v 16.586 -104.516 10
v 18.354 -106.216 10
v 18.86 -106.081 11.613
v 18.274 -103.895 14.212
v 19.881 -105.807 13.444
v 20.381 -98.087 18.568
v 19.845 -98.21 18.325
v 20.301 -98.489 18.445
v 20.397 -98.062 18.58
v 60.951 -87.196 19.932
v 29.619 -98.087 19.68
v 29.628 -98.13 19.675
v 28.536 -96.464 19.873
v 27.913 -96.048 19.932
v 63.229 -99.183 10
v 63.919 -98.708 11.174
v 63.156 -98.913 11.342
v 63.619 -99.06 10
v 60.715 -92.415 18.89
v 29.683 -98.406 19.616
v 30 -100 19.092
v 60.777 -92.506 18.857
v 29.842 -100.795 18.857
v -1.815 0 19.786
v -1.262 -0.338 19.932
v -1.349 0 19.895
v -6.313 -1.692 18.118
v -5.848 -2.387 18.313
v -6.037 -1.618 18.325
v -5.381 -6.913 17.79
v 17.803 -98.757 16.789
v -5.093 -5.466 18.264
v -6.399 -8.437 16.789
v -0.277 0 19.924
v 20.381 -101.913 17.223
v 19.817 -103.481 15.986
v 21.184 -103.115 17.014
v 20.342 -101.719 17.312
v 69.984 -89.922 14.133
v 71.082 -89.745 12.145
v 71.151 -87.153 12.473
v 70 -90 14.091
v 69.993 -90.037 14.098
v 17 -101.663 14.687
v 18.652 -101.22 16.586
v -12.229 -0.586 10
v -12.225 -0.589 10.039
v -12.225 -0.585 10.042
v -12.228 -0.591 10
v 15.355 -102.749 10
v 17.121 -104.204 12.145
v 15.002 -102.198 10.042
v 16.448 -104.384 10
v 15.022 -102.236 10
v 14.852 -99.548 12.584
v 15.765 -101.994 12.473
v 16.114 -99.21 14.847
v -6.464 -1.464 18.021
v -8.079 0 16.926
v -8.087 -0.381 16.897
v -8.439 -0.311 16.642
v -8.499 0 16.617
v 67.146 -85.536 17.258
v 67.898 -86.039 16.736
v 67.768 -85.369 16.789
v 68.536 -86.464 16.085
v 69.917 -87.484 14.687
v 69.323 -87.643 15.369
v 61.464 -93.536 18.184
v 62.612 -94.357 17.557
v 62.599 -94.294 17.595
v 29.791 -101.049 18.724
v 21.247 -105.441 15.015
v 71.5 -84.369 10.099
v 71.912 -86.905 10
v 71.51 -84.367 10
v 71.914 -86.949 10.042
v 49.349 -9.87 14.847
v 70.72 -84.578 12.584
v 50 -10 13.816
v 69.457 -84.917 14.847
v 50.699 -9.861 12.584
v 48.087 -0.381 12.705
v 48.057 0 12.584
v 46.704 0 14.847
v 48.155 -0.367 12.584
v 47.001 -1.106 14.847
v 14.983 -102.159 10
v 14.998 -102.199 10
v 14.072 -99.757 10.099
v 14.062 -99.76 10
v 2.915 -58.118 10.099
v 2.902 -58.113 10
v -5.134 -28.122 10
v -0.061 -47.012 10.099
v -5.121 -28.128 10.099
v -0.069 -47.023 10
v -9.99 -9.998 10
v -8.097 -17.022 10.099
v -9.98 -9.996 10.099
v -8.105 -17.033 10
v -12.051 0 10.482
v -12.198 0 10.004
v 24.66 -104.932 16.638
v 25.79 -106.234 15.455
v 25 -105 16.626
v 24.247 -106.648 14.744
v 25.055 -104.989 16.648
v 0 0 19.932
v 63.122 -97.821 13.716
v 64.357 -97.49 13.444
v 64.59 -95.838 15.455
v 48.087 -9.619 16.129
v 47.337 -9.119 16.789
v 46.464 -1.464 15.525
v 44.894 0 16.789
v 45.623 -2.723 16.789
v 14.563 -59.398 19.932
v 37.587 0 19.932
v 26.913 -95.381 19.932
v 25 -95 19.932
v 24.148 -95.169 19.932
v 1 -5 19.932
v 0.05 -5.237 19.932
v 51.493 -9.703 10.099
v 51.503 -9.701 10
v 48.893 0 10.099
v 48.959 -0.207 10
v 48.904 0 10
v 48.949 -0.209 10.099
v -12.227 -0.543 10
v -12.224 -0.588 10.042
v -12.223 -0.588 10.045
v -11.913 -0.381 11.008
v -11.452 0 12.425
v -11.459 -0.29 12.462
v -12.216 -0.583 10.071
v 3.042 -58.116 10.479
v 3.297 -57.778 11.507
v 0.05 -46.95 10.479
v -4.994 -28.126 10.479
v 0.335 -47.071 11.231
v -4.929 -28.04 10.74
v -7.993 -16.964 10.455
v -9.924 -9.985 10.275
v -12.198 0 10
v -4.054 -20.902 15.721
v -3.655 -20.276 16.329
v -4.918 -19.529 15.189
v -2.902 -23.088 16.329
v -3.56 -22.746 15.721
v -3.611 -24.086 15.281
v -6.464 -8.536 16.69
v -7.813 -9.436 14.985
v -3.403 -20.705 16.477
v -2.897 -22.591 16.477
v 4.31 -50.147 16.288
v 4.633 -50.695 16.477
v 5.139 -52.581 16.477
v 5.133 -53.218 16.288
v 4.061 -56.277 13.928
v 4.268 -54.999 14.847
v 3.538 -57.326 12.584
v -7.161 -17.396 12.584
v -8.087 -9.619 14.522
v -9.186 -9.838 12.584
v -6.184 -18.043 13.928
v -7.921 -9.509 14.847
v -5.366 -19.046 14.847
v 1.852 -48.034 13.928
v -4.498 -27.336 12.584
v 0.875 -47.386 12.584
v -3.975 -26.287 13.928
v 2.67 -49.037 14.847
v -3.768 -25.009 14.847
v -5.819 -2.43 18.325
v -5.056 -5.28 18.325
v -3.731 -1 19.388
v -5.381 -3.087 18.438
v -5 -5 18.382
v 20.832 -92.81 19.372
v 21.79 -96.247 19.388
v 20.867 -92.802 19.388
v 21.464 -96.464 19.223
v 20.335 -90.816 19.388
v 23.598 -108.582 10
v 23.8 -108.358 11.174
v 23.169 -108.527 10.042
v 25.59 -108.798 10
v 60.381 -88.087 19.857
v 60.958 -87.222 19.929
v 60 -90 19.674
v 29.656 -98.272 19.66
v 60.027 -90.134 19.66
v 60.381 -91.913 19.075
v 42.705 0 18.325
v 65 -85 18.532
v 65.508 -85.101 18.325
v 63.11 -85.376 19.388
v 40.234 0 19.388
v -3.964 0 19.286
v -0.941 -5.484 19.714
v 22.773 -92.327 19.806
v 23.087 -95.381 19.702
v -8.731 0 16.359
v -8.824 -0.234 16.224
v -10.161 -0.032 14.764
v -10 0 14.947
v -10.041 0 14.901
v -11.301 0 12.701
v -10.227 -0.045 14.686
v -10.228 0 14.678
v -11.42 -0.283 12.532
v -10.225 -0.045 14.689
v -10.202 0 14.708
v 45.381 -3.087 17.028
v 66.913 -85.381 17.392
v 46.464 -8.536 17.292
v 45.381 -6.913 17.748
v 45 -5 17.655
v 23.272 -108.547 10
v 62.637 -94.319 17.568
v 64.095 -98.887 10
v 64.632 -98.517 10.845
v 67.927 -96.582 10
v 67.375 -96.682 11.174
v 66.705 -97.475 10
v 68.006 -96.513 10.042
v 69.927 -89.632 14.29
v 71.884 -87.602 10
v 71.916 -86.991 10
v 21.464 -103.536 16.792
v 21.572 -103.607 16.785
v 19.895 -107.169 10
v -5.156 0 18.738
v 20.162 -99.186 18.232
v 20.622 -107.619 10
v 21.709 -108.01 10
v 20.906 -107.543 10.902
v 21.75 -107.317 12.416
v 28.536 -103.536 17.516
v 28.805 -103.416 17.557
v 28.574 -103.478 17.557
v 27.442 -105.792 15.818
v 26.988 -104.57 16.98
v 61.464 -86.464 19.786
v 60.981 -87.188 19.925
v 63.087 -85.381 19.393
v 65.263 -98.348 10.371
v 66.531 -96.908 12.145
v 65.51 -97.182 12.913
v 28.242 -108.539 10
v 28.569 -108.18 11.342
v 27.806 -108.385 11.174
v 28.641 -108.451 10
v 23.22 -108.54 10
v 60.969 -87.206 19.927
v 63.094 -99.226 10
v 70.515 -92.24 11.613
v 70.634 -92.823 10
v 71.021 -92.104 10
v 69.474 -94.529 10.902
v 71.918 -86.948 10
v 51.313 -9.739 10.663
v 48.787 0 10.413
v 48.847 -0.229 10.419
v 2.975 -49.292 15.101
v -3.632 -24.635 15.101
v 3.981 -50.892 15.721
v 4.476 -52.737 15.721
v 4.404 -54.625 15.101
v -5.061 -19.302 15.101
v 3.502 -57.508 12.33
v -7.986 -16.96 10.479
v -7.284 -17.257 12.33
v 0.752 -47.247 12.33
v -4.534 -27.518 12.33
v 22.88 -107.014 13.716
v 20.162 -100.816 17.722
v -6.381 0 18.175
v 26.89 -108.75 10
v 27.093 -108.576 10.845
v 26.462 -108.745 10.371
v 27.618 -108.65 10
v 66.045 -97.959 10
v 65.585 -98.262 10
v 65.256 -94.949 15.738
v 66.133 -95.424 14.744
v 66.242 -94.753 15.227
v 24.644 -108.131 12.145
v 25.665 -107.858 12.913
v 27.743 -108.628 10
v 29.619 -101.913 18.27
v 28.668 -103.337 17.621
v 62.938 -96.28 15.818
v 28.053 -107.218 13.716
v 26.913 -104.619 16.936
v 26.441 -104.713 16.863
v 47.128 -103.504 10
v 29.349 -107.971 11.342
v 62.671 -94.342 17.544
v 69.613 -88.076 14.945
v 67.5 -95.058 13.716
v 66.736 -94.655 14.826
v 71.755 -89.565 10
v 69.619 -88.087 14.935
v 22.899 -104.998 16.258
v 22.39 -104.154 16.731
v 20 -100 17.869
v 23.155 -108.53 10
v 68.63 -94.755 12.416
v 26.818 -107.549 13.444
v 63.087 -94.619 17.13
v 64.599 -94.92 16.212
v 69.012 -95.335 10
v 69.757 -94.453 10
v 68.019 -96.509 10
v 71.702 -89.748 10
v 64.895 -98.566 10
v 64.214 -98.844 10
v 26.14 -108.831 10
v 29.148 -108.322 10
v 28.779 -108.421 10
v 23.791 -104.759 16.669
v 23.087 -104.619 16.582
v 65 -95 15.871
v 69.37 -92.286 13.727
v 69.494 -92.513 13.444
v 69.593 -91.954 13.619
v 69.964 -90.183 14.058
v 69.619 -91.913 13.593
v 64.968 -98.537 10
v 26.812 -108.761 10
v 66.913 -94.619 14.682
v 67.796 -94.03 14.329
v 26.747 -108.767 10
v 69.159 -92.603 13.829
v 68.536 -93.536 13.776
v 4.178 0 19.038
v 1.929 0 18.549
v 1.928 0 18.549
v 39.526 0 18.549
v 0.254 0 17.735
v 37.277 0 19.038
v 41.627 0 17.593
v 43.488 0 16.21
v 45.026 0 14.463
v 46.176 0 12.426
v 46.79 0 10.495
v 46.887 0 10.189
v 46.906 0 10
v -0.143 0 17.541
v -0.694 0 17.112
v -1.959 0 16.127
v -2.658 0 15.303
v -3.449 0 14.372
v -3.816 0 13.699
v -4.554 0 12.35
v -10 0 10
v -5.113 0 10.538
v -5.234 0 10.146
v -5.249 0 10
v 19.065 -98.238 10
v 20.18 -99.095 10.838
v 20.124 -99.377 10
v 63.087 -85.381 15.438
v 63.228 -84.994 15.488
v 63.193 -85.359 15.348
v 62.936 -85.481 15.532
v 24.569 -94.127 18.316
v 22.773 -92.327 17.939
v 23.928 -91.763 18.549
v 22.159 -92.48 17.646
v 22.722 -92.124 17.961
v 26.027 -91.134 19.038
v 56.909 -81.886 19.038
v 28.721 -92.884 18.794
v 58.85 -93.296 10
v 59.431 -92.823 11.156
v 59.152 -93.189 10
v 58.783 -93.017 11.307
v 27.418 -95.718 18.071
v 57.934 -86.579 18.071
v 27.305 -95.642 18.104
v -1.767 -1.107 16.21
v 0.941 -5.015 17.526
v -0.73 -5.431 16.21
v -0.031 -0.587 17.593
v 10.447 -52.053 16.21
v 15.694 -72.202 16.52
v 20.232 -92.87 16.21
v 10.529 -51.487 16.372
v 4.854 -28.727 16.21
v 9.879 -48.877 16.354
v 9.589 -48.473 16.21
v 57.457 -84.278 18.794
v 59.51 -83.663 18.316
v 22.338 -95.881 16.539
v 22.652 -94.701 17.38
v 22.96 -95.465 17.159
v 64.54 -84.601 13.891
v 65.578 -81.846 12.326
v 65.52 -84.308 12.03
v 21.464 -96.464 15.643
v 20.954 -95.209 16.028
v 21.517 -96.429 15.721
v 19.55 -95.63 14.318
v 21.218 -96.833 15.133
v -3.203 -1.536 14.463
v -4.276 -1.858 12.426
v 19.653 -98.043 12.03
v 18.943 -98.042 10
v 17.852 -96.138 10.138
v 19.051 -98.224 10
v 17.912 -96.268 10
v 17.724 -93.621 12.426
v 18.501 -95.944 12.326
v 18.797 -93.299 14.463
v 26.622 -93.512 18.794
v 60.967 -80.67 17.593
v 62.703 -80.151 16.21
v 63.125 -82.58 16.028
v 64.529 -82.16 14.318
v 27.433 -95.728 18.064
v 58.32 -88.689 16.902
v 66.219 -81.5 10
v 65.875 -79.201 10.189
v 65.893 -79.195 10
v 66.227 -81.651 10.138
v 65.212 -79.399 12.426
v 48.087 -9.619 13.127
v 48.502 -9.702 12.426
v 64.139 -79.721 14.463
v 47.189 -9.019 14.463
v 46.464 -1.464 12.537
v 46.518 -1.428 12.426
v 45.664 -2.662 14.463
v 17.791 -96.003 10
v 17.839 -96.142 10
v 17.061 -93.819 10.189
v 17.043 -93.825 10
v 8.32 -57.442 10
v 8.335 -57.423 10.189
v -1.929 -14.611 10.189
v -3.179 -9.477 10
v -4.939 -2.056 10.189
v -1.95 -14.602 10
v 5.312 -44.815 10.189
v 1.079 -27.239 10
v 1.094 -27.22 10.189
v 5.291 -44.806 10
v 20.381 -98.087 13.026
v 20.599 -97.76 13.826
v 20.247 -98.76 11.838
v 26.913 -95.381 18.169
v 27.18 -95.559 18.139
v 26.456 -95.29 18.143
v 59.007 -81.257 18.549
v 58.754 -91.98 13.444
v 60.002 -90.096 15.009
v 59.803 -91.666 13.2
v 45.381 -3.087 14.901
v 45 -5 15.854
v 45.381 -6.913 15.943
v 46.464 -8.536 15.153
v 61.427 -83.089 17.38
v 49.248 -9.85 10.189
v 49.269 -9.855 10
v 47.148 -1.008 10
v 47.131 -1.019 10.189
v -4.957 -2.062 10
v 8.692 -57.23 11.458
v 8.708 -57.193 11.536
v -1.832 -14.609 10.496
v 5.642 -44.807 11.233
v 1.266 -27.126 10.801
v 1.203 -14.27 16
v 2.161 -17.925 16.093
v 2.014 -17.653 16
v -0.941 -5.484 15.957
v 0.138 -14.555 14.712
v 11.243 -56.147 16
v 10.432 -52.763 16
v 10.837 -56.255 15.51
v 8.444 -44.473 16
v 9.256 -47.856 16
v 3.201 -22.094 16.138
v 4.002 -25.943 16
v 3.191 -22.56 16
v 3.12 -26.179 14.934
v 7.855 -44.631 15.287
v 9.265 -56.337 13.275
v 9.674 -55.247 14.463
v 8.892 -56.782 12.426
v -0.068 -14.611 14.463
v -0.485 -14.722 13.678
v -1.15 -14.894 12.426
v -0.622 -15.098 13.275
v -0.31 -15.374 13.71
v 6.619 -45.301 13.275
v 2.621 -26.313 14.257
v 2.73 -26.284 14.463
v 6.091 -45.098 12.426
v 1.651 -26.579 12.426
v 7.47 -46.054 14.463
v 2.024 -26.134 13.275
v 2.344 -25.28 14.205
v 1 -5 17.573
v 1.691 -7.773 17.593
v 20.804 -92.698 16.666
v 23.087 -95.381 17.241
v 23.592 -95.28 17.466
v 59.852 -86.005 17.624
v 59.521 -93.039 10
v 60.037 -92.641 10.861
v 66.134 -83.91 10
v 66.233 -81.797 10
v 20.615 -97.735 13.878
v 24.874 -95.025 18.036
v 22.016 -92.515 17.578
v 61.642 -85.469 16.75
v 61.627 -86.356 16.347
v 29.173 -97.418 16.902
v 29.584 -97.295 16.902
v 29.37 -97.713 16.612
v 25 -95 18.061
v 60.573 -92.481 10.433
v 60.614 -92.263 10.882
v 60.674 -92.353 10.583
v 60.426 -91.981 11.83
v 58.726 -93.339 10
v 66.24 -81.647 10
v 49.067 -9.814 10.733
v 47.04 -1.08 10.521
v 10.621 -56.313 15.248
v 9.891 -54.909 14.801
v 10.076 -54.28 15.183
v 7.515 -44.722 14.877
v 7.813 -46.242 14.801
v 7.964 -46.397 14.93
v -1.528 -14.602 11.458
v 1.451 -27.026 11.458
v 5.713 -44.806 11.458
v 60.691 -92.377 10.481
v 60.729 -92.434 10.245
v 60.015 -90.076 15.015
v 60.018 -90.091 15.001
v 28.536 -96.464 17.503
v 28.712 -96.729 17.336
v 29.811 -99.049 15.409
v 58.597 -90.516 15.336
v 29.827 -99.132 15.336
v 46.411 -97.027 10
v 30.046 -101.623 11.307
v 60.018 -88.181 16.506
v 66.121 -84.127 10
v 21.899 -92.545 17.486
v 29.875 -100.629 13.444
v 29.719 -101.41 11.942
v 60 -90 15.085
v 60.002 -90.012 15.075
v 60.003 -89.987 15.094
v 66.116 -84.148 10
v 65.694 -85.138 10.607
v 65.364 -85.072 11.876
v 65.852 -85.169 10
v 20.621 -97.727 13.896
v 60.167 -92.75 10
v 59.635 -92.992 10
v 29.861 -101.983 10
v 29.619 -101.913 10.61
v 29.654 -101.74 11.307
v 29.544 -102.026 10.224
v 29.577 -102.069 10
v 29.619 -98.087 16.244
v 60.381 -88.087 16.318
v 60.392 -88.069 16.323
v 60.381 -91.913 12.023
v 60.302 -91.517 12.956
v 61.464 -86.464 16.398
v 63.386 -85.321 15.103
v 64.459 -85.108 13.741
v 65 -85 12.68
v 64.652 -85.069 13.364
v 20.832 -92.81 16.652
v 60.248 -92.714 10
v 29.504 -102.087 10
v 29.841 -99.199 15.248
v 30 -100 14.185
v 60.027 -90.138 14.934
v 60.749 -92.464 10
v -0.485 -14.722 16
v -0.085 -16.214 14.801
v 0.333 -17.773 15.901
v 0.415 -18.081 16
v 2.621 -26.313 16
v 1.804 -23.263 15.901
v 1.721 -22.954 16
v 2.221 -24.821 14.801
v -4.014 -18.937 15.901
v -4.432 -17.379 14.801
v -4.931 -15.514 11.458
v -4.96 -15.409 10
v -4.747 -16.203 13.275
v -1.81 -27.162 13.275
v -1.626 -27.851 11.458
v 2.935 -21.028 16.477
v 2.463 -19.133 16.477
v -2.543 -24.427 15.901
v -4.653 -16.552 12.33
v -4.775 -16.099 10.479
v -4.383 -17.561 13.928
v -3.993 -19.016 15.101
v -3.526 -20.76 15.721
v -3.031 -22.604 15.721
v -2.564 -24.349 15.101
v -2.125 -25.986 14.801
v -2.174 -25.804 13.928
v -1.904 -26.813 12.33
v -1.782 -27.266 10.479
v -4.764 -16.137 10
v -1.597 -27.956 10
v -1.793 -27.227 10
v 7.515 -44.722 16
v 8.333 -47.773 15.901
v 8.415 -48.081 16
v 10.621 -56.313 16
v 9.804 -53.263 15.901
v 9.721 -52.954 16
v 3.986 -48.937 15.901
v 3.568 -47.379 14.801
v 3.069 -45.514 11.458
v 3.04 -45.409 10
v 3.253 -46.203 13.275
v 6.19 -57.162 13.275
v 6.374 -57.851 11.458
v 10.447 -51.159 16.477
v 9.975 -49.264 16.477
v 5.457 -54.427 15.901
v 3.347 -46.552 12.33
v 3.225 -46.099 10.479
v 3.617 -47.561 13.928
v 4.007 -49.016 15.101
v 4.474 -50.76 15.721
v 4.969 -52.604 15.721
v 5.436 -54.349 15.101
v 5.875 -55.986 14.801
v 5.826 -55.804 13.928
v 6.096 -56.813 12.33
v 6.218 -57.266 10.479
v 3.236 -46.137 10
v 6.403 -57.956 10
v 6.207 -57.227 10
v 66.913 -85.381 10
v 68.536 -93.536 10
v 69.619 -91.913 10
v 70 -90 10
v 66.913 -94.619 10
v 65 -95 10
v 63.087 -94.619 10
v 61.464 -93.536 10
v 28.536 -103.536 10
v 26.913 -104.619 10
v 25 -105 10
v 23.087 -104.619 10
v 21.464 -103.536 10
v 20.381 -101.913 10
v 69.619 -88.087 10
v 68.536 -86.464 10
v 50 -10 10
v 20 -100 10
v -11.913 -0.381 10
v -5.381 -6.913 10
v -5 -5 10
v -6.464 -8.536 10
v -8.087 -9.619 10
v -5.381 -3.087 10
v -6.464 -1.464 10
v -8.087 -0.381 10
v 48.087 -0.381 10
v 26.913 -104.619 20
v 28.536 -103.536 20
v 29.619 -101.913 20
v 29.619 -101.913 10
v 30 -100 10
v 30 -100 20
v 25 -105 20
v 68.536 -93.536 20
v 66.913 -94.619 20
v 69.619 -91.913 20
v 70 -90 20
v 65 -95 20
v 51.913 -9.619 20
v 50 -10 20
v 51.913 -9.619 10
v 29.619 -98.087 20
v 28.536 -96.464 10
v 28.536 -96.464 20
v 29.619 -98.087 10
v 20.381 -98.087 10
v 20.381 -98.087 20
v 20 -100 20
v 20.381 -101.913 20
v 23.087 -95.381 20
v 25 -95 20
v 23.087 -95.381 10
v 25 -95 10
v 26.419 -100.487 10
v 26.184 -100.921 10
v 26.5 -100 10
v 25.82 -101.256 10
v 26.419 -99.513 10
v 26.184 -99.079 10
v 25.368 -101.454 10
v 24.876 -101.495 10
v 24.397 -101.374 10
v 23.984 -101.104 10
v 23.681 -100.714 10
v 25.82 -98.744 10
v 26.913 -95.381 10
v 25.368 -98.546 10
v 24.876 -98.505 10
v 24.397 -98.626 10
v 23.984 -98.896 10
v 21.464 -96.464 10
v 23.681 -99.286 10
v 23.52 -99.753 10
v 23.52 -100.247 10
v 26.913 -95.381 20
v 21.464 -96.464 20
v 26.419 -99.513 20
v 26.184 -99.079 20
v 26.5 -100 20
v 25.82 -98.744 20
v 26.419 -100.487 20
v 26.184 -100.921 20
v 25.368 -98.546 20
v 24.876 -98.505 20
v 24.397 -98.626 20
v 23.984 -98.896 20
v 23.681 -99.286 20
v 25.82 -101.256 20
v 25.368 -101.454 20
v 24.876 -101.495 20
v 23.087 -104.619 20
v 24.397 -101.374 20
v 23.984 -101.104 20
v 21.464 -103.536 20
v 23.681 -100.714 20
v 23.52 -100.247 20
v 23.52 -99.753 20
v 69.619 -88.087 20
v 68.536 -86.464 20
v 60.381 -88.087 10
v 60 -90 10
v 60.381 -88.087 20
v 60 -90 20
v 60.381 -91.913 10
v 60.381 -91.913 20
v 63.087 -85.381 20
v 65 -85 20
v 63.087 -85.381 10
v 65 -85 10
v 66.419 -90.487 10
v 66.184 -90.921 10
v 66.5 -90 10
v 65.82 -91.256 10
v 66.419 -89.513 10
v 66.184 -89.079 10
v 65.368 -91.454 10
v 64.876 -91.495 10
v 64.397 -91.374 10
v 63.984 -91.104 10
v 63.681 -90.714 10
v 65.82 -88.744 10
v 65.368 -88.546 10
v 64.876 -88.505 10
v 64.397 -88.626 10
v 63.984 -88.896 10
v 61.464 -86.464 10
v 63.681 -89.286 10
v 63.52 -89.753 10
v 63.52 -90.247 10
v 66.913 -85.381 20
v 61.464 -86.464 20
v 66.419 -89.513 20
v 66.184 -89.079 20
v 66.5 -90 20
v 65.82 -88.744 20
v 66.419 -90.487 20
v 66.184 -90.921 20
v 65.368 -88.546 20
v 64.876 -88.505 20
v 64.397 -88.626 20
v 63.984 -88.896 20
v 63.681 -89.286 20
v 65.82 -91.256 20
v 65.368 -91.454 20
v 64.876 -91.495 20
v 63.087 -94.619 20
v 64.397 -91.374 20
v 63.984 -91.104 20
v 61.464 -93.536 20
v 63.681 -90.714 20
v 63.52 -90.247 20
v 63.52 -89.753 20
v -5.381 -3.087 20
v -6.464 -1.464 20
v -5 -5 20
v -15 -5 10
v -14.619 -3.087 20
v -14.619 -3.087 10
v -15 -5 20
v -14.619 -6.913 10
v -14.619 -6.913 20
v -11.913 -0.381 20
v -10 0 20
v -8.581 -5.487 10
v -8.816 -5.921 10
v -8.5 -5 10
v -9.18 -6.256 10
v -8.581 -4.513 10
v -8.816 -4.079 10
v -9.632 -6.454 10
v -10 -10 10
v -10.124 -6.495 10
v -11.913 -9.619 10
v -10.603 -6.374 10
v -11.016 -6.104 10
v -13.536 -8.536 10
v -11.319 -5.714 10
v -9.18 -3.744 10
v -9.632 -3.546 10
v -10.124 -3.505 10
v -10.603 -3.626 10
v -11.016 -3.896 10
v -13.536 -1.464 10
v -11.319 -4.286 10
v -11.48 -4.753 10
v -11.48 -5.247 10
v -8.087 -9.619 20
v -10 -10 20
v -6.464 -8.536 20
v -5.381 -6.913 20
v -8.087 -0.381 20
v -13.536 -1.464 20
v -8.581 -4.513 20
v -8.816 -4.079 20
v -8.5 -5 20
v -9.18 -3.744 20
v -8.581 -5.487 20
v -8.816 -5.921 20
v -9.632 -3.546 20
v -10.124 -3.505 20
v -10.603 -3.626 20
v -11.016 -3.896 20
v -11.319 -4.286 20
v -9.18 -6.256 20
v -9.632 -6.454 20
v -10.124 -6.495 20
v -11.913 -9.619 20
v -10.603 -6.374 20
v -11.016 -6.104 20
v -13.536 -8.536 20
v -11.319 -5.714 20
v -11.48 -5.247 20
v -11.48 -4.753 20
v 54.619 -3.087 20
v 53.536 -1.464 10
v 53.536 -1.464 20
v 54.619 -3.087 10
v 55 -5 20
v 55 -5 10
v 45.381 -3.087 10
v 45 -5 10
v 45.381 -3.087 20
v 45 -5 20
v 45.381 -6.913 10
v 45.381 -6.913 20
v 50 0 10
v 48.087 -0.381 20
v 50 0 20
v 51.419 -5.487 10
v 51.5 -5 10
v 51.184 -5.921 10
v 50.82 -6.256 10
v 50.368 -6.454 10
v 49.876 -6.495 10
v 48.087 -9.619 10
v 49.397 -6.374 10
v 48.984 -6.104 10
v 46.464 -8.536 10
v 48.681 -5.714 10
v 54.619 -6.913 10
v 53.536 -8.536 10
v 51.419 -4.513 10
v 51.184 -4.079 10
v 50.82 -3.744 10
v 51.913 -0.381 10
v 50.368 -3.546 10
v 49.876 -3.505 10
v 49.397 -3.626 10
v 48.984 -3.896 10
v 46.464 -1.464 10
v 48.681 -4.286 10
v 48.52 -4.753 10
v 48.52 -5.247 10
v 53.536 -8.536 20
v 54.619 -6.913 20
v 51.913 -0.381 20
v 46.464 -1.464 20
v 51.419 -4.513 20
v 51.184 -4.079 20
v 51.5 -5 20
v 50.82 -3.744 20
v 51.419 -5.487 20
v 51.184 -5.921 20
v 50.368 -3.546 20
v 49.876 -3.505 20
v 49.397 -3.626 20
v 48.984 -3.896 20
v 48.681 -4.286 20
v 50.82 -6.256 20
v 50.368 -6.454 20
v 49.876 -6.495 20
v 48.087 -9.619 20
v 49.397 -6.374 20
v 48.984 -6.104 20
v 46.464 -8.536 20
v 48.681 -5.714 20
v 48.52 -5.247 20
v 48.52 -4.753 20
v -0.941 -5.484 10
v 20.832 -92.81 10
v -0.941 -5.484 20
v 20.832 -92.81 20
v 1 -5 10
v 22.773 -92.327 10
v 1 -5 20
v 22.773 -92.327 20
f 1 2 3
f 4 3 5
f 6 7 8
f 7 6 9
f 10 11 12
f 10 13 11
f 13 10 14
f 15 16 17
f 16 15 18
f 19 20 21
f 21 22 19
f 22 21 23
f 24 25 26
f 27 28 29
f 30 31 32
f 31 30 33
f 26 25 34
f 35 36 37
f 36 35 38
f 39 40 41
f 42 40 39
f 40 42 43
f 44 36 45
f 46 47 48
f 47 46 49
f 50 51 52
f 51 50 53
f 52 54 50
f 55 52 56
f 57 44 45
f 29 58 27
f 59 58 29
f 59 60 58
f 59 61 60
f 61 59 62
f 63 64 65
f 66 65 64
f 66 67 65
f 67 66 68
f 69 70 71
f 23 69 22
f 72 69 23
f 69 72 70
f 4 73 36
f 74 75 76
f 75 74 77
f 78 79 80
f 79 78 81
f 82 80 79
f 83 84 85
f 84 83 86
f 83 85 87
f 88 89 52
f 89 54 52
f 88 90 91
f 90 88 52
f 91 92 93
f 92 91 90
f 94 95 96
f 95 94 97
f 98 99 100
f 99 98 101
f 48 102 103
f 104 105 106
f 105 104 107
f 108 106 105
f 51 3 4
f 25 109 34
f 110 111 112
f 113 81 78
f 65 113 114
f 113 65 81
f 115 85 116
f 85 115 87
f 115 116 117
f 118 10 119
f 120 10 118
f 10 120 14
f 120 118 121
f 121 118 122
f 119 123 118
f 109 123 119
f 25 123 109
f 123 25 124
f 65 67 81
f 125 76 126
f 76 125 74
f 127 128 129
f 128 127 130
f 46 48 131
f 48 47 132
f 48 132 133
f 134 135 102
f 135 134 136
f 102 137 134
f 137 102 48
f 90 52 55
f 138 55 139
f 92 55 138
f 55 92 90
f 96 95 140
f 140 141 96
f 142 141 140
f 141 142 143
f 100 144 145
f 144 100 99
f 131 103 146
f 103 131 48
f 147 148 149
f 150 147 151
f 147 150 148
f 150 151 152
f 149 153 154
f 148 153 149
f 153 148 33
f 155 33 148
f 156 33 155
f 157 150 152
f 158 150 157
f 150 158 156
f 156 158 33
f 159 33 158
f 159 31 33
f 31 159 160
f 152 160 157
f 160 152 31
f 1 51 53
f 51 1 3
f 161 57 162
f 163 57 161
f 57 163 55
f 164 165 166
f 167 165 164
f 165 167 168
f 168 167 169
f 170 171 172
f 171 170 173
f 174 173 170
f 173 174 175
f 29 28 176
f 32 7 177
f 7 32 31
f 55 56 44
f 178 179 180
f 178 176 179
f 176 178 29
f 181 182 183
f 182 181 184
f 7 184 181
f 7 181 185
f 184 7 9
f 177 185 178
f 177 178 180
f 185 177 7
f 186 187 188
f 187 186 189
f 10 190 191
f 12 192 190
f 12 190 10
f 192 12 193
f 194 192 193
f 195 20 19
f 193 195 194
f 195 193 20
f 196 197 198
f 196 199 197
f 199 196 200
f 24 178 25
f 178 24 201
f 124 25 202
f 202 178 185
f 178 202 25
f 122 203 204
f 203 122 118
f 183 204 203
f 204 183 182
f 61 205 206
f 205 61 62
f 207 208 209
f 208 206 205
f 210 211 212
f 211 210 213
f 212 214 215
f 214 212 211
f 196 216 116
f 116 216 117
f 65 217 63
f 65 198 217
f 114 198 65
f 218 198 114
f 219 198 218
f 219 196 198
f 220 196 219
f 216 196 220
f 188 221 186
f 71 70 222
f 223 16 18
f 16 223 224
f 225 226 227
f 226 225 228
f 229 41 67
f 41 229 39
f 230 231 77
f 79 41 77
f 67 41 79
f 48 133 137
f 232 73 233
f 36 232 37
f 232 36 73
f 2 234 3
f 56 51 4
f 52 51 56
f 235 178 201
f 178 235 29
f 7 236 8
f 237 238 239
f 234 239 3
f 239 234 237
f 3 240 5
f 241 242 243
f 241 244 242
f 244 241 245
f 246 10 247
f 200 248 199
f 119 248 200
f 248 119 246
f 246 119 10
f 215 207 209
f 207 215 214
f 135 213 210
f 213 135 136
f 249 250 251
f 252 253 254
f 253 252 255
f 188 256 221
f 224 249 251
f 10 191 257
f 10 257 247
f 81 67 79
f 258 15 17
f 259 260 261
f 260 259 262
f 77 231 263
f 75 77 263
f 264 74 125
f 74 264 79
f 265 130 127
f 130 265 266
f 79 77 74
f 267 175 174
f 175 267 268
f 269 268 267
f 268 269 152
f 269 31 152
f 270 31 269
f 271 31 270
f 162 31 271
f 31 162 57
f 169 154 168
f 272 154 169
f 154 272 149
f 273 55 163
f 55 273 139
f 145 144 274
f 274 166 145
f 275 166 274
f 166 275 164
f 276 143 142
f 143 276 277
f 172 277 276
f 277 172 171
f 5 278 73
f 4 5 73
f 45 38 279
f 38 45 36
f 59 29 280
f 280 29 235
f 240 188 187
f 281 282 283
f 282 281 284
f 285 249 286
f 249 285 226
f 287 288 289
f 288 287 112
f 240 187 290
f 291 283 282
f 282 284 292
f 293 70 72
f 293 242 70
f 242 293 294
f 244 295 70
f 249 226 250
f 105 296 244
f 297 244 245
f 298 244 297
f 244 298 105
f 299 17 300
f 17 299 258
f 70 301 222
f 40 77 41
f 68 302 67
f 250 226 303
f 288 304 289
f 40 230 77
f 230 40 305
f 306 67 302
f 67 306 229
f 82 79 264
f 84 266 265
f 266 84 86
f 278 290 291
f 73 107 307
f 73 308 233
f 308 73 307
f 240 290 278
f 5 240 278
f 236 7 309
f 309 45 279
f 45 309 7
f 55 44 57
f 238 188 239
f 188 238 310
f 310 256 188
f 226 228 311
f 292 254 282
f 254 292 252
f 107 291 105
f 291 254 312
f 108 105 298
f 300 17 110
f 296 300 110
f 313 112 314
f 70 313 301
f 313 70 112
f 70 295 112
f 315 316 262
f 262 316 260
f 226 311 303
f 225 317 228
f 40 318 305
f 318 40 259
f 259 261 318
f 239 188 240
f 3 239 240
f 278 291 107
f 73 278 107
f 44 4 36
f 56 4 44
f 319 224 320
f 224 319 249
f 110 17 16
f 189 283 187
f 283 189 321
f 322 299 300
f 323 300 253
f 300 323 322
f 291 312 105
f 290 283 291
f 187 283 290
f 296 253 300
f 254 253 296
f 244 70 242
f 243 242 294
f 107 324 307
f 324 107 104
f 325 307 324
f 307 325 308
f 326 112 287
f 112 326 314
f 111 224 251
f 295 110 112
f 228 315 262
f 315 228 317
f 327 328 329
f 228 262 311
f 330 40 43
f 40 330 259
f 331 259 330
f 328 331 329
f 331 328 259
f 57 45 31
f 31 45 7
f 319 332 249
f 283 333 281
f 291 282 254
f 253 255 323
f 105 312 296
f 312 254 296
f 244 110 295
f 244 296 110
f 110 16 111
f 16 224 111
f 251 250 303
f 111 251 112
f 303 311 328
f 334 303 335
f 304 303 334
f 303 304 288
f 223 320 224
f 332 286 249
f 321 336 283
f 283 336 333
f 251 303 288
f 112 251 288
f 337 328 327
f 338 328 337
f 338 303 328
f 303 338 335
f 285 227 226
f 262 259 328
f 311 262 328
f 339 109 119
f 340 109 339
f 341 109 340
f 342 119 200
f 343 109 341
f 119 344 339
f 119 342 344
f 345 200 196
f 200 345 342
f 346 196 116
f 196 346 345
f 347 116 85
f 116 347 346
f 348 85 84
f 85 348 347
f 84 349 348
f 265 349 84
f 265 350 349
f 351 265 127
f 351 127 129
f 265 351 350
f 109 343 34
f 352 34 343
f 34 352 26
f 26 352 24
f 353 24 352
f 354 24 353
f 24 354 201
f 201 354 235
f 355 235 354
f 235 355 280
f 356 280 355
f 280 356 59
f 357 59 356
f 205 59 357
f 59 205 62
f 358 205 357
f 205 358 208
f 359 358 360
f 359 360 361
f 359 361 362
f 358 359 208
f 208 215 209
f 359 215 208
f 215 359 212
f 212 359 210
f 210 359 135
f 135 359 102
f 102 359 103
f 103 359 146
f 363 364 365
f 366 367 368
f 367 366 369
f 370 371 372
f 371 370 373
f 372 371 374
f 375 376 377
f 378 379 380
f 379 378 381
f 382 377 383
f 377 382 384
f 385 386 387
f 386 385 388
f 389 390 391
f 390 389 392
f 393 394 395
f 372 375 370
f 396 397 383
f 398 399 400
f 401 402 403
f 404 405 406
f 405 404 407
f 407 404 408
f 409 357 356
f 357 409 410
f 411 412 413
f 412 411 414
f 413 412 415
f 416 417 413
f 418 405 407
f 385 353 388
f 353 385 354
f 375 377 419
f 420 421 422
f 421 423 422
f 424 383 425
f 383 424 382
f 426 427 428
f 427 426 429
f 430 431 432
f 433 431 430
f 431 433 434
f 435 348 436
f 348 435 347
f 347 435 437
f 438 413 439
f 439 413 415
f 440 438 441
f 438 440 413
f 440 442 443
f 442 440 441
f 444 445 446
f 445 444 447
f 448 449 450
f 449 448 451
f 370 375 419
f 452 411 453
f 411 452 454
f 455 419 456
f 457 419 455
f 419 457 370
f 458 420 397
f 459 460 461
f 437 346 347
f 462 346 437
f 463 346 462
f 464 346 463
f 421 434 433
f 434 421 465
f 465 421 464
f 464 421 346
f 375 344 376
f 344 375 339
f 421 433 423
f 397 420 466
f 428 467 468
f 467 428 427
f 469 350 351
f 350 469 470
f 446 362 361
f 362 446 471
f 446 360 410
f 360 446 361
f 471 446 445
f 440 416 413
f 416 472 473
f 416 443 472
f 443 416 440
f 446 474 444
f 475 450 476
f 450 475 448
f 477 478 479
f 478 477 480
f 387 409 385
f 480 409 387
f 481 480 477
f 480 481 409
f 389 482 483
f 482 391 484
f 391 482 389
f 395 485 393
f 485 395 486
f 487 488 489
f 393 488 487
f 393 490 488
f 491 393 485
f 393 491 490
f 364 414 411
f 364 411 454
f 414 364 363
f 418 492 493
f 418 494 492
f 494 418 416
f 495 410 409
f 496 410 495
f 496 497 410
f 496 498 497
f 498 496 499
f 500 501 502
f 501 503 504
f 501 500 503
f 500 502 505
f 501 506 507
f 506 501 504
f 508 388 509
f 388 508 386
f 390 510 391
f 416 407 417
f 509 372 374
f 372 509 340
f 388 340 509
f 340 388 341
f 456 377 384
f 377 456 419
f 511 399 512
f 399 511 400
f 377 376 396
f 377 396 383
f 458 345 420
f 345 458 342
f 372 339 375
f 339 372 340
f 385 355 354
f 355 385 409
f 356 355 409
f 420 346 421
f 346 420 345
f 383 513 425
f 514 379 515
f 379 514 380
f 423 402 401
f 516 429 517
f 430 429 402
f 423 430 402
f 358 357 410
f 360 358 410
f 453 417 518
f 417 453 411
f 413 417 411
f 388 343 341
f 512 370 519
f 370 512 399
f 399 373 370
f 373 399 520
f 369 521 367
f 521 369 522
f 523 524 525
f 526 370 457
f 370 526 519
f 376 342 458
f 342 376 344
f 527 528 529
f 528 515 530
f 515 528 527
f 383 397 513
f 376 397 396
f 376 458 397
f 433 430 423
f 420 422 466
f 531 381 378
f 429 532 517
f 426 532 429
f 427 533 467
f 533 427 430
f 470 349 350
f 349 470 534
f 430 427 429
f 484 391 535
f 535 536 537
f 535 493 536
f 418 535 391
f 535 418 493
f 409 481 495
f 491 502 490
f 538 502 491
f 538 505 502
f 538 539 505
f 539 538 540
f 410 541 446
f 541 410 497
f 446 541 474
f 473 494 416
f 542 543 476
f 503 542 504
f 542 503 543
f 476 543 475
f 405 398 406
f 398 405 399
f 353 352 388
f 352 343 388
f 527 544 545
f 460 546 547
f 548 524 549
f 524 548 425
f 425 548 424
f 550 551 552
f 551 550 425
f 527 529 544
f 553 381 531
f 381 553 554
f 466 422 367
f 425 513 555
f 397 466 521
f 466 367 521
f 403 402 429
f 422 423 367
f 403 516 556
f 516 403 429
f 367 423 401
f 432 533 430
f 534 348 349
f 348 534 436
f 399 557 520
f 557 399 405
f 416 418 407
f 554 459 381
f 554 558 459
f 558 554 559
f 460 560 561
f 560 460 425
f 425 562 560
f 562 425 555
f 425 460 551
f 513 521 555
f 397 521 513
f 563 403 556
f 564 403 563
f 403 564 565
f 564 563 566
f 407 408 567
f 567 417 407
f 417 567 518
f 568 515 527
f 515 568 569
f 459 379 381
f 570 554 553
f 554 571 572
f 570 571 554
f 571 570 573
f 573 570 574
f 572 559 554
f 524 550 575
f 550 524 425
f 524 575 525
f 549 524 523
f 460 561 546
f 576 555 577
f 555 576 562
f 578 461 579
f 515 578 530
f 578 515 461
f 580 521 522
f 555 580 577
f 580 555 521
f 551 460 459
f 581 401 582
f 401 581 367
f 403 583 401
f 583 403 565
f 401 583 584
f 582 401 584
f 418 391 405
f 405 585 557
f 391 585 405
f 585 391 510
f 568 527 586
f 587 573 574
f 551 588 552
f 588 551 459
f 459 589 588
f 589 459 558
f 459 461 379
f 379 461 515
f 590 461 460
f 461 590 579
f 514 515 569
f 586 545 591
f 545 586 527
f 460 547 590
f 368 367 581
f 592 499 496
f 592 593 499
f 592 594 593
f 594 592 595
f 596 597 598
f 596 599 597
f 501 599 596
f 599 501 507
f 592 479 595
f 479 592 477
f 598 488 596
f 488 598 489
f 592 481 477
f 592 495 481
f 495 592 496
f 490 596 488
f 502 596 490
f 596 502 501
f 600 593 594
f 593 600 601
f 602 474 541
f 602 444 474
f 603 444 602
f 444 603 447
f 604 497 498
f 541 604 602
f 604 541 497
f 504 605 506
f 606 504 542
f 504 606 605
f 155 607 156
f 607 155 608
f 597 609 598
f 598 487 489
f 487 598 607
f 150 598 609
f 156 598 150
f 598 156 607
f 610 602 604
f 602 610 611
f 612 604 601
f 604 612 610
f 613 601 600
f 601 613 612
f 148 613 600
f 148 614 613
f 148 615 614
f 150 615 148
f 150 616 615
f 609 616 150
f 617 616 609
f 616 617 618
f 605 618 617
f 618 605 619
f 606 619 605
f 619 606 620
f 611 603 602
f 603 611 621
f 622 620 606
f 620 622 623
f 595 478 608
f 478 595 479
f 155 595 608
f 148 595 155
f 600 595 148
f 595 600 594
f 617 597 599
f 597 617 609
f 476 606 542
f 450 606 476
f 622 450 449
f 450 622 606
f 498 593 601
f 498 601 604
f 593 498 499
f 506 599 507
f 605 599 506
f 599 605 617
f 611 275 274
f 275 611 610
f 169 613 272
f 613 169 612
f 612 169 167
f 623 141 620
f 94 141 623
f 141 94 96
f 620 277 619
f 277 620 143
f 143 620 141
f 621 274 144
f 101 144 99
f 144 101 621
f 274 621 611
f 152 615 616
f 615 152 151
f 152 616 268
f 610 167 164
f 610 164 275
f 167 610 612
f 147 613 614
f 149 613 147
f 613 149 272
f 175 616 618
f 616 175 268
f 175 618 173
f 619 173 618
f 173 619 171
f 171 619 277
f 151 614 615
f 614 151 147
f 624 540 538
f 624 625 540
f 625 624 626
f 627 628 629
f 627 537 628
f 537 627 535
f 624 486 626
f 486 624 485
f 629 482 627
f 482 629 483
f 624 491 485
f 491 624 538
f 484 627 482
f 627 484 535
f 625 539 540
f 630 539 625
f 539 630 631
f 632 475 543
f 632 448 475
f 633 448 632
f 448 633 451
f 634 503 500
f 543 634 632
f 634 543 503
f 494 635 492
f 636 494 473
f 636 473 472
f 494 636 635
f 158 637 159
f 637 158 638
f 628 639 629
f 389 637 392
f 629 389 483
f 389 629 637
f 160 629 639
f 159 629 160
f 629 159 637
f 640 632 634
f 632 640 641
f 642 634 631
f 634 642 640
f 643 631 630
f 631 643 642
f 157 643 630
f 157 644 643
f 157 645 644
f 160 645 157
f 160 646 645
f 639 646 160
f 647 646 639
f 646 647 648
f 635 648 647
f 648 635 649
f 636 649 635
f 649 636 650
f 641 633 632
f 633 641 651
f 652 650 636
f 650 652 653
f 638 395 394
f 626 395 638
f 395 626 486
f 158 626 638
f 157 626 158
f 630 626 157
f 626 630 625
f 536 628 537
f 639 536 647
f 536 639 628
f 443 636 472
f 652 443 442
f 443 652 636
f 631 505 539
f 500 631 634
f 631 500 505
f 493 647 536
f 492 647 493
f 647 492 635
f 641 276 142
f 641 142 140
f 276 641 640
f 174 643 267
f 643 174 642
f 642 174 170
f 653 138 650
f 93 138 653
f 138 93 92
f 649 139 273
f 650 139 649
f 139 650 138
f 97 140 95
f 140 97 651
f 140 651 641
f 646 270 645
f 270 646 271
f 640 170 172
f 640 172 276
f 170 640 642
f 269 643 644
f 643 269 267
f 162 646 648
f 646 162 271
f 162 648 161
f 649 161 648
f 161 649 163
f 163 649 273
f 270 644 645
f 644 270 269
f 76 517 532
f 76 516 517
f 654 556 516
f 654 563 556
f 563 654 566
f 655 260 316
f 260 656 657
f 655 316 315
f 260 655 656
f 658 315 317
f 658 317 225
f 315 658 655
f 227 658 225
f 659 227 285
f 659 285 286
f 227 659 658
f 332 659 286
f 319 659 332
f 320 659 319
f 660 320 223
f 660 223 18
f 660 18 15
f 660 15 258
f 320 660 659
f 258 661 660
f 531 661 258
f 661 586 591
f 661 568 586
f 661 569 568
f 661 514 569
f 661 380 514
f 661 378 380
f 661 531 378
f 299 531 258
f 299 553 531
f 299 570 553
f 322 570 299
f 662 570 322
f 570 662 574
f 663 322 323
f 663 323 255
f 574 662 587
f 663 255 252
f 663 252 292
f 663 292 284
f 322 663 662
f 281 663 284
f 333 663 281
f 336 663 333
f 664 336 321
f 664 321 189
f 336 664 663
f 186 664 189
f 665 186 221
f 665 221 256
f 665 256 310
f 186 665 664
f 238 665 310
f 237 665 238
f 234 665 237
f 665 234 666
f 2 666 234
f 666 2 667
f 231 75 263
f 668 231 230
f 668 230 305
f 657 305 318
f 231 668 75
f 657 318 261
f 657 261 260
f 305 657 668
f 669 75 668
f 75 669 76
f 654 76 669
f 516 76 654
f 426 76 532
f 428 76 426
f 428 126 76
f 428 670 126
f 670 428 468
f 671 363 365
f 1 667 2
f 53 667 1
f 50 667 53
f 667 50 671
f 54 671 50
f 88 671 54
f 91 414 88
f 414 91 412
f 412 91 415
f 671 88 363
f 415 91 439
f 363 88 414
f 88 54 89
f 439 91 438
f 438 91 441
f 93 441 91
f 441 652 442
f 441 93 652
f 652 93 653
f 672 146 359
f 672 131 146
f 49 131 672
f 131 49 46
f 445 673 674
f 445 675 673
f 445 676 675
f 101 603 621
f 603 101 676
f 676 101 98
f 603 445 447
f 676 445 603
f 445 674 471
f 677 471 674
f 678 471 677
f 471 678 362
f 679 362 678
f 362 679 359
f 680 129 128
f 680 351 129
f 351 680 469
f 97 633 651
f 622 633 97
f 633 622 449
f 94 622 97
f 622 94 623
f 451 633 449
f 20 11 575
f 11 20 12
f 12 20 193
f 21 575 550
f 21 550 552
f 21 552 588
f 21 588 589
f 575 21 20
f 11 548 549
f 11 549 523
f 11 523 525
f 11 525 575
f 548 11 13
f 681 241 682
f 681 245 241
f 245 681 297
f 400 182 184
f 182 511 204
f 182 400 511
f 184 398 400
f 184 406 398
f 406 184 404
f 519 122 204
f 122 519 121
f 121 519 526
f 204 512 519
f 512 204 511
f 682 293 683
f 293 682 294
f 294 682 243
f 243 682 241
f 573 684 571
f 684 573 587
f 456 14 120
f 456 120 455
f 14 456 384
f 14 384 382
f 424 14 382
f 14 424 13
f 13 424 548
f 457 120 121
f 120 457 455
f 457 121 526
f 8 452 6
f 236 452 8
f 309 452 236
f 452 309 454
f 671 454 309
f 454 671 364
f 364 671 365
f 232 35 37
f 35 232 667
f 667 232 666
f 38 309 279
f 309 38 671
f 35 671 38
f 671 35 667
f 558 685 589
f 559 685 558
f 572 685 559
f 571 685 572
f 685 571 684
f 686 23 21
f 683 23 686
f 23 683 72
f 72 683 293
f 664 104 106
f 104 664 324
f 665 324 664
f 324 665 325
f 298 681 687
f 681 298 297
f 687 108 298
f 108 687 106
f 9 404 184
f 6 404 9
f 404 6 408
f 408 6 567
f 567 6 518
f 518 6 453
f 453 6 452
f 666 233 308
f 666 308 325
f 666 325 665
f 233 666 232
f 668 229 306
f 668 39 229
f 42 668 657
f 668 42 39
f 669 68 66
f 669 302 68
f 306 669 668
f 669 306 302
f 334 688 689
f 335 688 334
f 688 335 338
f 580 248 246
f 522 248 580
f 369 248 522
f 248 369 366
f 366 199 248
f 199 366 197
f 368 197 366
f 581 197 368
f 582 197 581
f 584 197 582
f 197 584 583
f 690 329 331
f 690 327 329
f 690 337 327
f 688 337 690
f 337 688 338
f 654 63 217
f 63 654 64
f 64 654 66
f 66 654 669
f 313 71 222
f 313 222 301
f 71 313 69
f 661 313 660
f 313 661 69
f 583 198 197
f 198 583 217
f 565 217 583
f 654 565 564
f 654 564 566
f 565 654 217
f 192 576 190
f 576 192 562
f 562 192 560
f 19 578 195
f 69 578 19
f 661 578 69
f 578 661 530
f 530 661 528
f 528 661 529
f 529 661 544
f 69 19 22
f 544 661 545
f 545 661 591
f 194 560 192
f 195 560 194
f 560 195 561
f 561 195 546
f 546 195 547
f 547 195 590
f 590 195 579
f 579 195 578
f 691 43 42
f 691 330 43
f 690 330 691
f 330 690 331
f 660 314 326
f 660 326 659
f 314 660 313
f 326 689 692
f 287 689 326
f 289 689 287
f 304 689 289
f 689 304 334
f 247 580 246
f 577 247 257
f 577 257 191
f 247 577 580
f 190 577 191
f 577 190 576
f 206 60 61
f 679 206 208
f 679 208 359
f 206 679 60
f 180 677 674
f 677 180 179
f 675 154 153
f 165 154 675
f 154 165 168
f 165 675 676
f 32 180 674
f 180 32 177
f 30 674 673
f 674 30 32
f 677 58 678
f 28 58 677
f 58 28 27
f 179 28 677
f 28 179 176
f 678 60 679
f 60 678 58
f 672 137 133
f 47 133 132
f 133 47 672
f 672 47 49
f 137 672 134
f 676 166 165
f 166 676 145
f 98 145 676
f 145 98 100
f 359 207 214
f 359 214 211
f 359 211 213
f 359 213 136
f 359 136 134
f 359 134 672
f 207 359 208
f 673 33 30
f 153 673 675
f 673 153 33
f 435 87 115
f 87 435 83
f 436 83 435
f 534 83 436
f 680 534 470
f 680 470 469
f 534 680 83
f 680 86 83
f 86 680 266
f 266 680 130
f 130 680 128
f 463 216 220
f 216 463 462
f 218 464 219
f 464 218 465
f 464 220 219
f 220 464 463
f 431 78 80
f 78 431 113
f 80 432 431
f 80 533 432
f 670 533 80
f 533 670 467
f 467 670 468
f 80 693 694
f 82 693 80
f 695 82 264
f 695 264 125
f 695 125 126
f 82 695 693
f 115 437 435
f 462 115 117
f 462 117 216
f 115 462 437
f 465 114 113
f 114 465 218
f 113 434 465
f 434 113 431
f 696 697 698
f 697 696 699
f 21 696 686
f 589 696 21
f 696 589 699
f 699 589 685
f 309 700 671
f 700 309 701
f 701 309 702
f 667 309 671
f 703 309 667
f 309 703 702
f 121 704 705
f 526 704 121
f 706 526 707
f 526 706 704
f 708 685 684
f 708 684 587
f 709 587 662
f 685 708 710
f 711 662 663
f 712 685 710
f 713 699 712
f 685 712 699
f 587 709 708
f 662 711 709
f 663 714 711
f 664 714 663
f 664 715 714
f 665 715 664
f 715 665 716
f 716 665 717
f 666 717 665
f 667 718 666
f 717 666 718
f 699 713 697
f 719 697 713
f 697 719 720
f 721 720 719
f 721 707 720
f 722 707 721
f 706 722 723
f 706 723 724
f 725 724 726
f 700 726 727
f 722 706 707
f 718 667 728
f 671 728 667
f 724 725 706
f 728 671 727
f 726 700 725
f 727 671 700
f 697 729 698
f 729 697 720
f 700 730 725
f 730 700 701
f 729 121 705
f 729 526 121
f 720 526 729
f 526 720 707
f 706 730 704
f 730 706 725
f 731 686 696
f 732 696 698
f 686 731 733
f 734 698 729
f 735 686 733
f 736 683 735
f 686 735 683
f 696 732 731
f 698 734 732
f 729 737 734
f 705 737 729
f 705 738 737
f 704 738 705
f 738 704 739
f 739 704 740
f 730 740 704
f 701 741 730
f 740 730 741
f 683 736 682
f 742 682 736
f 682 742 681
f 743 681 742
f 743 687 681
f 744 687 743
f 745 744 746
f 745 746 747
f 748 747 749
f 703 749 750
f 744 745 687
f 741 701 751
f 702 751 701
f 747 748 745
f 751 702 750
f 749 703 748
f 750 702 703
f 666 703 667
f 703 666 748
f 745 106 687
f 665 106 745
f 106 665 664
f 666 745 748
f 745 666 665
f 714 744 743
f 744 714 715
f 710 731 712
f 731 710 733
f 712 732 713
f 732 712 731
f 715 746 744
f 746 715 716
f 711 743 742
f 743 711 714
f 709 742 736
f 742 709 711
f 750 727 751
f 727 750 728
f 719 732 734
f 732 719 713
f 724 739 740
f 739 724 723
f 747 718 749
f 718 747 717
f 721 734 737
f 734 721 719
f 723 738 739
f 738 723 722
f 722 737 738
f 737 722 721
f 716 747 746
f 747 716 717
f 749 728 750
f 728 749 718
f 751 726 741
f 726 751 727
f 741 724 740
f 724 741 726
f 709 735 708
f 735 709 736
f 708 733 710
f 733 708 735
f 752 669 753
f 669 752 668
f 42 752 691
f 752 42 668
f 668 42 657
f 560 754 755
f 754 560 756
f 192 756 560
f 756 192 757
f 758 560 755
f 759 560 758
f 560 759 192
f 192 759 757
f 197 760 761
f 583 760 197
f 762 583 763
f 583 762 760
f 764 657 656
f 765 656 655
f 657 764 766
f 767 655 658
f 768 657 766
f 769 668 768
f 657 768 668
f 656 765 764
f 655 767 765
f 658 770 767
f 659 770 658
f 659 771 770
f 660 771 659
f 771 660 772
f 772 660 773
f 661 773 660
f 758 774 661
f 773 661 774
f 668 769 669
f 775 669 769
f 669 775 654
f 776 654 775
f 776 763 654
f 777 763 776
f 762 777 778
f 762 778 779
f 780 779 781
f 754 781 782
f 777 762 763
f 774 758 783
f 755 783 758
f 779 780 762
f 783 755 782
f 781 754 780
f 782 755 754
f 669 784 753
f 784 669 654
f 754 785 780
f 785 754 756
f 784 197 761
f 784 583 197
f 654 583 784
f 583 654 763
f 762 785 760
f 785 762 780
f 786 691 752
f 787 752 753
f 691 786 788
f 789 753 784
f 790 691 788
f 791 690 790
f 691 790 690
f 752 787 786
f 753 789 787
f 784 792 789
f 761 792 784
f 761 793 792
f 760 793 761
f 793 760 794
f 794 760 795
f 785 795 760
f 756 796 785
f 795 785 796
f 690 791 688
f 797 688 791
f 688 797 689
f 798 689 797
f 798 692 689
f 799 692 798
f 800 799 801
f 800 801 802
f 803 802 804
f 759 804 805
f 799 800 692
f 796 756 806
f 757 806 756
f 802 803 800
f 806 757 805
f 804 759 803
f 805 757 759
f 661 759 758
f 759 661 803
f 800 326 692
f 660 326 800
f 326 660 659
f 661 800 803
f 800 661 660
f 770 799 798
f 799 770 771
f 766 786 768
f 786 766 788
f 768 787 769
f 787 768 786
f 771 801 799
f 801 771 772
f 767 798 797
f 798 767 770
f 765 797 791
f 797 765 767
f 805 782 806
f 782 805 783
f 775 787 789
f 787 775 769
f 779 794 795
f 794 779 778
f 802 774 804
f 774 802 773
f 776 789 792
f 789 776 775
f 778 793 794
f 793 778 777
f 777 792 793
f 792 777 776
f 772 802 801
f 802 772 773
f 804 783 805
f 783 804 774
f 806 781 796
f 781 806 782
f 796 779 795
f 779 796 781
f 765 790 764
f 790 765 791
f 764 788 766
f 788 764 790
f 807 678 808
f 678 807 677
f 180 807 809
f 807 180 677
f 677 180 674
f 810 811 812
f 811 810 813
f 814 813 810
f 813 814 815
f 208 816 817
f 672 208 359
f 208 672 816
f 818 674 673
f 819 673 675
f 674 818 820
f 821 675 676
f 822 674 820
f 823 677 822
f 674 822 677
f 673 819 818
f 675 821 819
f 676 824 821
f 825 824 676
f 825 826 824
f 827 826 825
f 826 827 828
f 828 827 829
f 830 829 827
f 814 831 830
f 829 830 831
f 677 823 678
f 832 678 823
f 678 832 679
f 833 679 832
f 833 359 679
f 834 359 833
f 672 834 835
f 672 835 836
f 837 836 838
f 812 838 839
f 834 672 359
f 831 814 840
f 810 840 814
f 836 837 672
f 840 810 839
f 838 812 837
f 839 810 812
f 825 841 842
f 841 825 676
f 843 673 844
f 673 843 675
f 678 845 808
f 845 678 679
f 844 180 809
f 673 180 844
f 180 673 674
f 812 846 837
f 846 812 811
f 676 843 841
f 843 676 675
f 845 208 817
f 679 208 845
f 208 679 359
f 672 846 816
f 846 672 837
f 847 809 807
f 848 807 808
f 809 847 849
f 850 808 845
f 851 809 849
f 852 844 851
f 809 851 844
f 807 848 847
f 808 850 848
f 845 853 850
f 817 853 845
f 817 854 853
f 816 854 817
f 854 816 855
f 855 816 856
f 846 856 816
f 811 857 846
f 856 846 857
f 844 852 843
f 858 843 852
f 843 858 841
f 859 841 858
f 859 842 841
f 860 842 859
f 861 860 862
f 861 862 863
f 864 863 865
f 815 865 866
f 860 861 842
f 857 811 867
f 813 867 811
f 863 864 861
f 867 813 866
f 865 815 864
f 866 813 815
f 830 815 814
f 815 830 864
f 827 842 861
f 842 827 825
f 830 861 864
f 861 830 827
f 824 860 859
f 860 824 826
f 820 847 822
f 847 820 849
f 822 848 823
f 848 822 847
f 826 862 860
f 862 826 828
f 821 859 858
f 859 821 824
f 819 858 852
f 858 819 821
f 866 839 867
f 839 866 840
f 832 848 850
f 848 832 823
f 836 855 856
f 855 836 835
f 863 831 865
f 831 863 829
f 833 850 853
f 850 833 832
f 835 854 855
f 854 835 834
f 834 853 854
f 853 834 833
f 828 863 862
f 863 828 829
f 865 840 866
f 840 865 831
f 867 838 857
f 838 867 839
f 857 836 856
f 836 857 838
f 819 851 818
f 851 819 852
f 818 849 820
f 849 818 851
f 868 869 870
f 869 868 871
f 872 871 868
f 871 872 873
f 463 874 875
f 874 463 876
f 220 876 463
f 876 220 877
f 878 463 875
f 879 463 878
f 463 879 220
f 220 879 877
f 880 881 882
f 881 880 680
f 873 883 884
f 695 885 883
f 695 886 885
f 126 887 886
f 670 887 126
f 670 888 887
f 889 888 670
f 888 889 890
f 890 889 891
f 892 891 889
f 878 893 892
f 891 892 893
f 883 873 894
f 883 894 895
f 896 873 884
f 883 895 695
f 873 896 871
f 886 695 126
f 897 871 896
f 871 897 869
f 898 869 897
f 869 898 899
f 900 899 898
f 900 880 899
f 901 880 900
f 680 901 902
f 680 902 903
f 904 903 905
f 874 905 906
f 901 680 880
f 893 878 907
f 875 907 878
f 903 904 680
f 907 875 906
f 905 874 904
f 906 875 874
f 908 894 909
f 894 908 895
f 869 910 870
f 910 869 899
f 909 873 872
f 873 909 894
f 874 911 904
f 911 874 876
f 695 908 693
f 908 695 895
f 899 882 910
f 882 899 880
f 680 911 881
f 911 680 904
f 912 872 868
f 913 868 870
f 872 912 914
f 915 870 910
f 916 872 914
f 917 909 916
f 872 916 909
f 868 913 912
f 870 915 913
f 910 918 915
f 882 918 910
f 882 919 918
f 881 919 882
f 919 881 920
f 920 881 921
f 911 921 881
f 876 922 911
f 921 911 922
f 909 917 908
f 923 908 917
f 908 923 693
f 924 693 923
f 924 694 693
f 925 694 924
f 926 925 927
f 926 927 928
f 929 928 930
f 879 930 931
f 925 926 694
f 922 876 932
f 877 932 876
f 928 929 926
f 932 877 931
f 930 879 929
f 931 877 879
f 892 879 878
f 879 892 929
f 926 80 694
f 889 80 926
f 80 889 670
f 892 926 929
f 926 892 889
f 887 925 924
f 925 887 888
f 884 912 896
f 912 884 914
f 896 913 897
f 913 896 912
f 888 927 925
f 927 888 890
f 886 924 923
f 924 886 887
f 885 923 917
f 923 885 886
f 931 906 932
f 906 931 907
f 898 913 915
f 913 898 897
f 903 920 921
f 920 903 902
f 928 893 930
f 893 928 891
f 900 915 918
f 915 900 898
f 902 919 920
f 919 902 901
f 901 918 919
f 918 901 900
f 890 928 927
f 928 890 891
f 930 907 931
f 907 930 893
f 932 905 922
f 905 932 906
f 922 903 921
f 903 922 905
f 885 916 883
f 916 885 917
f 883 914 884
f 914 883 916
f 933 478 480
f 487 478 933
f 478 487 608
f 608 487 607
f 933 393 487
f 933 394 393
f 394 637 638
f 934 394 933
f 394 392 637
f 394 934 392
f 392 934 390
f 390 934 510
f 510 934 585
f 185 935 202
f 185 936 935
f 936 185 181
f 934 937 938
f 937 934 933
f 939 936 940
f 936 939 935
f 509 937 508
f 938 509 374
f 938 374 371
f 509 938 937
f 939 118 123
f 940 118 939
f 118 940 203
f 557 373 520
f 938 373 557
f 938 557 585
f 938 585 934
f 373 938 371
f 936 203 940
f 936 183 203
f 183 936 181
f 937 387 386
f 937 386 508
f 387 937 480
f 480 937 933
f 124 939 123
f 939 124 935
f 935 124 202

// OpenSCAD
module button(){
 
 cube([12,12,4],center=true);   
 cylinder(d=7,h=7);
 translate([0,0,0])
    cylinder(d=13.1,h=6.5);
    translate([0,0,6.4])
        cylinder(d=11.6, h=4);
    
}

module bar(){
  translate([0,0,100])
    sphere(d=25);
sphere(d=25);
cylinder(h=100, d=25, $fs=0.25);  
}

module solidbase(){
    translate([0,0,12.5]){
        difference(){
            hull(){
                rotate([0,0,15]){
                    
                    rotate([90,0,0])
                        bar();
                
                    translate([35,0,0])
                        rotate([90,0,0])
                            bar();


                    translate([35,0,0])
                        rotate([90,0,0])
                            bar();
                
                    translate([0,0,0])
                        rotate([90,0,0])
                            bar();
              
                }
            }
            translate([20,15 ,7])
                cube([80,30,60], center=true);
        }
        
    }
    
}

module boss(){
    
    difference(){
        cylinder(d=10, h=10);
        translate([0,0,-1])
            cylinder(d=3, h=12, $fs=0.5);
    }
}

module bosshole(){
    
    
}

module lowerGrip(){
union(){        
        difference(){
            solidbase();
            translate([-20,-120,10])
                cube([100,200,30]);
            scale([0.85,0.95,0.90])
                translate([6,1,1])
                    solidbase();
           
           translate([3,-20,10])
            rotate([15,270,0])
                button();

            translate([11,-50,10])
                rotate([15,270,0])
                    button(); 
            
            translate([25,-100,0])
                cylinder(d=10, h=12);
        
            translate([65,-90,0])
                cylinder(d=10, h=12);
        
            translate([-10,-5,0])
                cylinder(d=10, h=12);
                
            translate([50,-5,0])
                cylinder(d=10, h=12);
        }
    
    translate([1,-5,0])
        rotate([0,0,180])   
            rotate([0,0,14])
                cube([2,90,10]);
    
    translate([25,-100,0])
        boss();
        
    translate([65,-90,0])
        boss();
        
    translate([-10,-5,0])
        boss();
        
    translate([50,-5,0])
        boss();
            
    }
}

module battery(){
    color("Teal",1)
        rotate([0,0,15])
            translate([0, -90, 2])
                cube([40,75,15]);
    
}

module Grip()
{
    
    //lowerGrip();
    
    translate([0,0,20])
        mirror([0,0,1])
            lowerGrip();   
    
}

union(){

    Grip();
    
    //battery();
    


}
